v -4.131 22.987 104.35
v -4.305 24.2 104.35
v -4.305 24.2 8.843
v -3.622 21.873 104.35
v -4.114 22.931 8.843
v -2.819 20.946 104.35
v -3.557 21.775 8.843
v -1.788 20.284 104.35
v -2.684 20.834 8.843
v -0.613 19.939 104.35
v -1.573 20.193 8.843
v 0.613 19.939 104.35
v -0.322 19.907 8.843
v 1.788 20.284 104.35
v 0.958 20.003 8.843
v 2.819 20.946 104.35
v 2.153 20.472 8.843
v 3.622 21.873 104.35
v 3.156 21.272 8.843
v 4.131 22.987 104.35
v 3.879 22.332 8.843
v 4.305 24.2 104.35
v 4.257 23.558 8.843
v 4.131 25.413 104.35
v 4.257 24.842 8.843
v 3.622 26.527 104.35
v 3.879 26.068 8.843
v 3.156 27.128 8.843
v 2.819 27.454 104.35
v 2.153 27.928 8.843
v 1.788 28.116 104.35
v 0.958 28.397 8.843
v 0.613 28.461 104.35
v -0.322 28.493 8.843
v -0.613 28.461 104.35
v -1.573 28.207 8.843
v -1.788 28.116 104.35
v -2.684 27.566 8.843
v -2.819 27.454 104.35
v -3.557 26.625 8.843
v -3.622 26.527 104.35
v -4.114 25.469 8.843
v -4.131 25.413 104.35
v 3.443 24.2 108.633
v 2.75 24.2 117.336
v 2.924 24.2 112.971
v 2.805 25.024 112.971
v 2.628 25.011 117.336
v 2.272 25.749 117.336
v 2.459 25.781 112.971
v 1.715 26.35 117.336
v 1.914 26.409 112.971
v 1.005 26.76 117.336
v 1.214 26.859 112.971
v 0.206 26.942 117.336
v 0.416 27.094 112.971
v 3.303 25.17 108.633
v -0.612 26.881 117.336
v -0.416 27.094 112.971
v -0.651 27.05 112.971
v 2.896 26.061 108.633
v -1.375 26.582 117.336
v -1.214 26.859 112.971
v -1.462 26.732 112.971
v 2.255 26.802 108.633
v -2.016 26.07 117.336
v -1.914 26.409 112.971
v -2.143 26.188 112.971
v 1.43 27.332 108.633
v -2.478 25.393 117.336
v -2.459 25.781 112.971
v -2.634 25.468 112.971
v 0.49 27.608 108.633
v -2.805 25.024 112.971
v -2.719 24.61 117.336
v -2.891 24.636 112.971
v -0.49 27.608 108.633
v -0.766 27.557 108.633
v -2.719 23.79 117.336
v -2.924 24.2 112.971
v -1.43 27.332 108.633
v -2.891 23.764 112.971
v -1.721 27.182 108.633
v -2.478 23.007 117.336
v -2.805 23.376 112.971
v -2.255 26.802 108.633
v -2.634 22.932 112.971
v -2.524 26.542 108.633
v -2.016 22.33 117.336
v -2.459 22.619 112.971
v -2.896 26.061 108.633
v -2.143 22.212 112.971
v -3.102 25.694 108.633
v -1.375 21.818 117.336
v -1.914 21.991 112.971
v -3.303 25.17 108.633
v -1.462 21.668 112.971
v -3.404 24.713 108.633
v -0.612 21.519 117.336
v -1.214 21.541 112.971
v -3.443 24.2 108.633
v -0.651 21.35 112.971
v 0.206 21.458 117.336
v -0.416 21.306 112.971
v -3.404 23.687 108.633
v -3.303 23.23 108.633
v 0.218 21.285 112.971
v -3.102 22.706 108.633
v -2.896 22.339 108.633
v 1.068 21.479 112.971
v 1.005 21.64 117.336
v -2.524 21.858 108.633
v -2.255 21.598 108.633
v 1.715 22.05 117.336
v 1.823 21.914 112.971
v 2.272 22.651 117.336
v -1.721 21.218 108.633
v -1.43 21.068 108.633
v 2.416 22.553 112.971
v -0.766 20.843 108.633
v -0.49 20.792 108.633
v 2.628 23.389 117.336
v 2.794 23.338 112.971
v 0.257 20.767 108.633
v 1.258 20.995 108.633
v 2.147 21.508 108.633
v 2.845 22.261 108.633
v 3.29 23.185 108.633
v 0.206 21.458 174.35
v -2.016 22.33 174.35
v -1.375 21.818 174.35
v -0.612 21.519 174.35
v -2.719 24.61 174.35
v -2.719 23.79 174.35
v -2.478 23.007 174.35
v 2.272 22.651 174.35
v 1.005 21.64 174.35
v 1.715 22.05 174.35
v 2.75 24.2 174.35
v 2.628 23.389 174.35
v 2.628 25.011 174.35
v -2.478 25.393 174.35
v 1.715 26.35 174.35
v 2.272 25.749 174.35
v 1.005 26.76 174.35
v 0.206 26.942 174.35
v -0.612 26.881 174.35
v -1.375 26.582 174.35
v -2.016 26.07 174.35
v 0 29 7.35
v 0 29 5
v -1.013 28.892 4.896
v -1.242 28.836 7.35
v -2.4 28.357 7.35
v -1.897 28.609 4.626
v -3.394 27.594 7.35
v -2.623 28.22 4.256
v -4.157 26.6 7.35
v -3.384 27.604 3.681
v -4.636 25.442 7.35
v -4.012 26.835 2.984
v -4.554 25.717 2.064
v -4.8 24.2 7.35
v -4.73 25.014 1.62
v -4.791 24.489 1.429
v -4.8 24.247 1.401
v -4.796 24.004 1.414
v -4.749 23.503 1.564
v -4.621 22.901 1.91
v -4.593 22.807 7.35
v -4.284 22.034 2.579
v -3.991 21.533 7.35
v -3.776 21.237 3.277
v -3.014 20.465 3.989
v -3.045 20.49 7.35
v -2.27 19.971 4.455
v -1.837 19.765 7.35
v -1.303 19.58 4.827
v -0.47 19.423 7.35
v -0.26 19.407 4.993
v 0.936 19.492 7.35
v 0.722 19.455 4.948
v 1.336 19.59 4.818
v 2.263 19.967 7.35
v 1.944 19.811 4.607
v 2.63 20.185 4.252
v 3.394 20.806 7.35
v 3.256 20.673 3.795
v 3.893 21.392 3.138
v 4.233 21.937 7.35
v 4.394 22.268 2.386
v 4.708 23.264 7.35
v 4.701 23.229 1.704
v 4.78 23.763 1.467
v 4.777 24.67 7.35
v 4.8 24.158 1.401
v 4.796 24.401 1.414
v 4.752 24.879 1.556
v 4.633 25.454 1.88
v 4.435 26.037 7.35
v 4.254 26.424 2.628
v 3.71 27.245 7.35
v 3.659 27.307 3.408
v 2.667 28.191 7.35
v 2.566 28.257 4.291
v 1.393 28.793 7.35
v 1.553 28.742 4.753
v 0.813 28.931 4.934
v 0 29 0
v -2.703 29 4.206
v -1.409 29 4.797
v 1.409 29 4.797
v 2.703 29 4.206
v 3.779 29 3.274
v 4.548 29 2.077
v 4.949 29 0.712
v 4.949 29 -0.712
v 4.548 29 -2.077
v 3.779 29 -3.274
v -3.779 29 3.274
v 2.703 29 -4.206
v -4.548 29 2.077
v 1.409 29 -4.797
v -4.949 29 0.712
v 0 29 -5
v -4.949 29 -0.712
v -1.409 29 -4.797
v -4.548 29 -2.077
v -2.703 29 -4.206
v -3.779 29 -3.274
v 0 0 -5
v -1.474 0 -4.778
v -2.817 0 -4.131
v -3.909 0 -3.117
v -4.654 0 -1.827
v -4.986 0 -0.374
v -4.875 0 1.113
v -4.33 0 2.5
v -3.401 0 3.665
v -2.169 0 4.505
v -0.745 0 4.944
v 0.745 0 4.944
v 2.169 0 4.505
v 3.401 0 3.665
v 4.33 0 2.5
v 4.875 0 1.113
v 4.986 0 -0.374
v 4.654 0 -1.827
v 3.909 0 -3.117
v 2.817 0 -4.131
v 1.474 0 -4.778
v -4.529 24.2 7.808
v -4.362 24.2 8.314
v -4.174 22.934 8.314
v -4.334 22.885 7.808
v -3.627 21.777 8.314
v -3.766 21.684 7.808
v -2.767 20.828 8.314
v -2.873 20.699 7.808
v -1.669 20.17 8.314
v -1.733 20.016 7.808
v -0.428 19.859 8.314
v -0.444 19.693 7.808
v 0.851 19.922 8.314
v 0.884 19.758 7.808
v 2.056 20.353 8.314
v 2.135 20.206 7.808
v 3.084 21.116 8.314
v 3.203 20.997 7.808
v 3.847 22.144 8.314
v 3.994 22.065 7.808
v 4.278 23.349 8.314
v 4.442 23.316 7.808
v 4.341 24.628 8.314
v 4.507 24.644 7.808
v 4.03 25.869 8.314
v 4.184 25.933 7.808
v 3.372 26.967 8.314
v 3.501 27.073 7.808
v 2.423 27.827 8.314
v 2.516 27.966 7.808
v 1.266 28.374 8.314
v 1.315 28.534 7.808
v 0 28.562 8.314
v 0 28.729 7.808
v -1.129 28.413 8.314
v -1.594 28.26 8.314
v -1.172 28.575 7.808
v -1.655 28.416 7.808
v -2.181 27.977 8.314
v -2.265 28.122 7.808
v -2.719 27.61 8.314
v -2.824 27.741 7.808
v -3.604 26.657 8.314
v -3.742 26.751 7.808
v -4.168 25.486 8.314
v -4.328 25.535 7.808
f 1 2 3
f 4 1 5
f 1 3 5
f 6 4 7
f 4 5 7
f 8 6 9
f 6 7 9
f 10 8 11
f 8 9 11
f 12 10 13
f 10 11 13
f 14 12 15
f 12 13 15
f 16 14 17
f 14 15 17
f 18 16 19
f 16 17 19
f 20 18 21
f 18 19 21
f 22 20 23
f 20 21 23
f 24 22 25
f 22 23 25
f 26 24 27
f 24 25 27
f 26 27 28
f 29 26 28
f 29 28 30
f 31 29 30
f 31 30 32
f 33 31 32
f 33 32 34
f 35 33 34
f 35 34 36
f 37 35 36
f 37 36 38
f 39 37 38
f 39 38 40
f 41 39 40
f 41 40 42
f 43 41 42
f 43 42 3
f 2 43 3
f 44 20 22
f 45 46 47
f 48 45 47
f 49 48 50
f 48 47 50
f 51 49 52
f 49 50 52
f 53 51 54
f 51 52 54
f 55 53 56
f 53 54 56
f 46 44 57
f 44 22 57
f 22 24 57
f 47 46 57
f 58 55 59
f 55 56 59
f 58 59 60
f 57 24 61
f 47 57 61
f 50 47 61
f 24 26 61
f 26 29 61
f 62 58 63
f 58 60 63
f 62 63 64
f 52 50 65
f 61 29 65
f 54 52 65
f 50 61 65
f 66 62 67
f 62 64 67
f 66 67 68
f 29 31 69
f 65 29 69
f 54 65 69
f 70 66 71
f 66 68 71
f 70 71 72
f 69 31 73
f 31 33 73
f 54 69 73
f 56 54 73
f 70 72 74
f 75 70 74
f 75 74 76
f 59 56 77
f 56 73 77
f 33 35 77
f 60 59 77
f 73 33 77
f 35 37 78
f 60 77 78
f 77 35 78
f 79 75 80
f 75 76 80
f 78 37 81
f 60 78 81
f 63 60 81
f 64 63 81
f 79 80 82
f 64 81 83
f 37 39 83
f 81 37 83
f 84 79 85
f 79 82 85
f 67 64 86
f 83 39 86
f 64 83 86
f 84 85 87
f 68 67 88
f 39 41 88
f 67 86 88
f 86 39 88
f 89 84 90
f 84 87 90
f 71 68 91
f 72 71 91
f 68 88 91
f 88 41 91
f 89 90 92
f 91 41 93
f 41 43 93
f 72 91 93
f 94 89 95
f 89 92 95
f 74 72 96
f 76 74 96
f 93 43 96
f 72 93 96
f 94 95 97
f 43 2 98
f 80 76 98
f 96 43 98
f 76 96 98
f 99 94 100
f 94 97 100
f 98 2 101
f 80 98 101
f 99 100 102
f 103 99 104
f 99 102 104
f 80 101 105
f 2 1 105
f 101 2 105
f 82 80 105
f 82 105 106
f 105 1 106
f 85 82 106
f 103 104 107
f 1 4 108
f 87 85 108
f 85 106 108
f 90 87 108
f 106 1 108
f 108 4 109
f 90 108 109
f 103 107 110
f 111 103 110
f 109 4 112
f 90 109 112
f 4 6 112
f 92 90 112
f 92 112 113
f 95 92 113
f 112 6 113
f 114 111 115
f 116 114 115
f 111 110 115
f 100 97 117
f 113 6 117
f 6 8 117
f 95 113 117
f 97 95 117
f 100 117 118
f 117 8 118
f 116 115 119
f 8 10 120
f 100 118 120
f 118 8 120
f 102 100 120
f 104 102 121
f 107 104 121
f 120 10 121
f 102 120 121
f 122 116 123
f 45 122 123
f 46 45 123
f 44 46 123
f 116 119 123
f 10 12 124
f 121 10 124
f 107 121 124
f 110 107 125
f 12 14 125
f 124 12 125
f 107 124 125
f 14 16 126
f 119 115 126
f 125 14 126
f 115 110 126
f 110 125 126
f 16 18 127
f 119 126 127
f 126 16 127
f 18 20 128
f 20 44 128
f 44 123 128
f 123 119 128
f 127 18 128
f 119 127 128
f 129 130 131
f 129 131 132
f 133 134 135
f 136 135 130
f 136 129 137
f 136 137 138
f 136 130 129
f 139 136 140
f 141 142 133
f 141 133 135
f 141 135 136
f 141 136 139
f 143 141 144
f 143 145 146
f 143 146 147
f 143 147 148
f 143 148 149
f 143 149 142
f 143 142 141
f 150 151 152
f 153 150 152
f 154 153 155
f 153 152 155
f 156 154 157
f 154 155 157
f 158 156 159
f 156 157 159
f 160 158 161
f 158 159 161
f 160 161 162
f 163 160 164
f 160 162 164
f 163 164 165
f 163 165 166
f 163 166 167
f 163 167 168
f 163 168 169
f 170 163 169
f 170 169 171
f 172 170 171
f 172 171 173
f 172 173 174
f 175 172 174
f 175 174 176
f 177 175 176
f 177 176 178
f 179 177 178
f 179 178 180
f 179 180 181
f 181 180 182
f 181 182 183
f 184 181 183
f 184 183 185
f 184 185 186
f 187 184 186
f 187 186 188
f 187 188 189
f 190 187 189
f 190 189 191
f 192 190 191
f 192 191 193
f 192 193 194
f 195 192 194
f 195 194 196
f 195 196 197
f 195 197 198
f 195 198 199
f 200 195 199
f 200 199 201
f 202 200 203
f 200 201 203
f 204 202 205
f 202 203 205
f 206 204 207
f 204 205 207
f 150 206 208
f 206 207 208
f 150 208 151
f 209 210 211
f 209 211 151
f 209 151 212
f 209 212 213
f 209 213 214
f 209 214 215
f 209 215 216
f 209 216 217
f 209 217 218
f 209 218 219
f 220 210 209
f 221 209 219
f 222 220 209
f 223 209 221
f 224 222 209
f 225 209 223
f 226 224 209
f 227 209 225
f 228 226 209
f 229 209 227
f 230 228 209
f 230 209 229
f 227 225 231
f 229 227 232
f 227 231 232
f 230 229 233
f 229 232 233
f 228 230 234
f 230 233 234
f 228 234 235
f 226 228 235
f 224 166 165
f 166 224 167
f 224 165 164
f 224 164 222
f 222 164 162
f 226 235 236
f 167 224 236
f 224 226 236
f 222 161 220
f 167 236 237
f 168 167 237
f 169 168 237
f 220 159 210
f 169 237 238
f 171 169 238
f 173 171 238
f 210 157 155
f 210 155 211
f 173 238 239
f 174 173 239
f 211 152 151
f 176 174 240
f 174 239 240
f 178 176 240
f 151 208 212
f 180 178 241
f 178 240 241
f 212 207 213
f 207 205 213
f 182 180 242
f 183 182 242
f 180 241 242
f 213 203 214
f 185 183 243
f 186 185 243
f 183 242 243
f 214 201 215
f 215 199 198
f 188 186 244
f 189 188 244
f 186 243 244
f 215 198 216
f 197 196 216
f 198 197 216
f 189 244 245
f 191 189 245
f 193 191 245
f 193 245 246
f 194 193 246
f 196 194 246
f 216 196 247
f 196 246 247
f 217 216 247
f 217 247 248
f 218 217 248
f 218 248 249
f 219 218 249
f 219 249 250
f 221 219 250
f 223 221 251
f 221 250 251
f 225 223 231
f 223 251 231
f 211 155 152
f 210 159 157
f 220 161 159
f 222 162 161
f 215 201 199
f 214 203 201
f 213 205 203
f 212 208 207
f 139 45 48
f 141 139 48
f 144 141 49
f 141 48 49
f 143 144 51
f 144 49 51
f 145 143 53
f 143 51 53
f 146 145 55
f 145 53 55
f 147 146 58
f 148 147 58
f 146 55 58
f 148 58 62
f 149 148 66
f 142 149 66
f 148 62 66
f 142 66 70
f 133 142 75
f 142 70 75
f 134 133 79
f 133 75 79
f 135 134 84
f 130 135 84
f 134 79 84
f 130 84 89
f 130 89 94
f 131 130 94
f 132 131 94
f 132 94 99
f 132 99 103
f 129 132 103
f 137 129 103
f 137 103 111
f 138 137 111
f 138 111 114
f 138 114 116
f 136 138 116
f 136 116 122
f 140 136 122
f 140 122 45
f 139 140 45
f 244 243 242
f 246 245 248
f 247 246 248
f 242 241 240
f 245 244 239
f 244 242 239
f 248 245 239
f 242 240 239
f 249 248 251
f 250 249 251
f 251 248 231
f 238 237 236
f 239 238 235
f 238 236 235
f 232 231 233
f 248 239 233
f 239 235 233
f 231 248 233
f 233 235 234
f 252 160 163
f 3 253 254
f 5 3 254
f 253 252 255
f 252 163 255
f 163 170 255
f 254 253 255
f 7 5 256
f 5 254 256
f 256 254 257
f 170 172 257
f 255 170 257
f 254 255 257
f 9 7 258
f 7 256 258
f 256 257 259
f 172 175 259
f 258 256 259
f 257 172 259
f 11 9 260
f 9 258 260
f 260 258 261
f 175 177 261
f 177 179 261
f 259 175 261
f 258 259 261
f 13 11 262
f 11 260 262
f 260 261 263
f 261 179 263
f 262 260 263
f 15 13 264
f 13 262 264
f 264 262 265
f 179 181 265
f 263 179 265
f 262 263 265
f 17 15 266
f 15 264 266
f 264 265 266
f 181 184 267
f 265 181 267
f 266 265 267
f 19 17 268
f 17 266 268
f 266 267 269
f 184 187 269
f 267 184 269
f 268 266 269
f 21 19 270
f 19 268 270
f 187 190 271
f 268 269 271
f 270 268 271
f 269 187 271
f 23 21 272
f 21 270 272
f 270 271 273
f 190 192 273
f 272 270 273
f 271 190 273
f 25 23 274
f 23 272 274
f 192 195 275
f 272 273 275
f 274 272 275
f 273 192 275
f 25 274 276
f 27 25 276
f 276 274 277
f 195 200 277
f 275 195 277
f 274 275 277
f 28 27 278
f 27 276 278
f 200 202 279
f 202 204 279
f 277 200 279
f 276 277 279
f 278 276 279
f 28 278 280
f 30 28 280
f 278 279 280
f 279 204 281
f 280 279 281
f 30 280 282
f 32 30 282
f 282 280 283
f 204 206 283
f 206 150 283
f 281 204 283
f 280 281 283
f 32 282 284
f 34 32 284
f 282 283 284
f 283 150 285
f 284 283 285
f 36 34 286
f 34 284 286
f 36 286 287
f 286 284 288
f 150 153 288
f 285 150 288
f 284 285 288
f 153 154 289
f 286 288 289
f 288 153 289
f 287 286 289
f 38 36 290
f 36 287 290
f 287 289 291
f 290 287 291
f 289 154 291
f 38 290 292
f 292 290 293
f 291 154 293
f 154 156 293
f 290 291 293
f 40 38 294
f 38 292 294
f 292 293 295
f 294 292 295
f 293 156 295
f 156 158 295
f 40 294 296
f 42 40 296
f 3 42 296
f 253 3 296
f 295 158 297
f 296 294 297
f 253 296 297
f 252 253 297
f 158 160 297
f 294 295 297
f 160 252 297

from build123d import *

# Parameters (mm, degrees)
SKETCH1_R           = 5
BOSS_EXTRUDE1_DEPTH = 29
SKETCH2_R           = 4.8
BOSS_EXTRUDE2_DEPTH = 7.35
SKETCH3_R           = 4.305
BOSS_EXTRUDE3_DEPTH = 97
SKETCH4_R           = 2.75
BOSS_EXTRUDE4_DEPTH = 70
FILLET1_R           = 55
FILLET2_R           = 2.5


with BuildPart() as part:
    # Sketch1 → Boss-Extrude1 (new body)
    with BuildSketch(Plane(origin=(0, 0, 0), x_dir=(1, 0, 0), z_dir=(0, 1, 0))):
        with Locations(Location((0, 0, 0), (0, 0, 90))):
            Circle(SKETCH1_R)
    extrude(amount=BOSS_EXTRUDE1_DEPTH)

    # Sketch2 → Boss-Extrude2 (add)
    with BuildSketch(Plane.XY):
        with Locations(Location((0, 24.2, 0), (0, 0, 90))):
            Circle(SKETCH2_R)
    extrude(amount=BOSS_EXTRUDE2_DEPTH)

    # Sketch3 → Boss-Extrude3 (add)
    with BuildSketch(Plane.XY.offset(7.35)):
        with Locations(Location((0, 24.2, 0), (0, 0, 180))):
            Circle(SKETCH3_R)
    extrude(amount=BOSS_EXTRUDE3_DEPTH)

    # Sketch4 → Boss-Extrude4 (add)
    with BuildSketch(Plane.XY.offset(104.35)):
        with Locations((0, 24.2)):
            Circle(SKETCH4_R)
    extrude(amount=BOSS_EXTRUDE4_DEPTH)

    # Fillet1
    # the kernel refuses this fillet: 55 mm, written as the material it adds along each edge
    with BuildSketch(Plane(origin=(0, 24.2, 104.35), x_dir=(1, 0, 0), z_dir=(0, -1, 0))) as fillet1_piece_1:
        with BuildLine():
            CenterArc((57.75, 12.985837478), FILLET1_R, 180, 13.656834666)
            Line((2.75, 12.985837478), (1.65, 12.985837478))
            Line((1.65, 12.985837478), (1.65, 0))
            Line((1.65, 0), (2.75, -1.1))
            ThreePointArc((2.75, -1.1), (3.5275, -1.1), (3.2361, -0.25971675))
            Line((3.2361, -0.25971675), (4.305, 0))
        make_face()
    revolve(axis=Axis((0, 24.2, 104.35), (0, 0, 1)))

    # Fillet2
    # the kernel refuses this fillet: 2.5 mm, written as the material it adds along each edge
    with BuildSketch(Plane(origin=(0, 24.2, 7.35), x_dir=(-1, 0, 0), z_dir=(0, 1, 0))) as fillet2_piece_1:
        with BuildLine():
            CenterArc((6.805, 1.493310082), FILLET2_R, 180, 36.678485047)
            Line((4.8, 0), (4.7599, -0.029866202))
            ThreePointArc((4.7599, -0.029866202), (4.5525, -0.05), (4.305, -0.05))
            Line((4.305, -0.05), (4.255, 0))
            Line((4.255, 0), (4.255, 1.493310082))
            Line((4.255, 1.493310082), (4.305, 1.493310082))
        make_face()
    revolve(axis=Axis((0, 24.2, 7.35), (0, 0, 1)))


solid = part.part
